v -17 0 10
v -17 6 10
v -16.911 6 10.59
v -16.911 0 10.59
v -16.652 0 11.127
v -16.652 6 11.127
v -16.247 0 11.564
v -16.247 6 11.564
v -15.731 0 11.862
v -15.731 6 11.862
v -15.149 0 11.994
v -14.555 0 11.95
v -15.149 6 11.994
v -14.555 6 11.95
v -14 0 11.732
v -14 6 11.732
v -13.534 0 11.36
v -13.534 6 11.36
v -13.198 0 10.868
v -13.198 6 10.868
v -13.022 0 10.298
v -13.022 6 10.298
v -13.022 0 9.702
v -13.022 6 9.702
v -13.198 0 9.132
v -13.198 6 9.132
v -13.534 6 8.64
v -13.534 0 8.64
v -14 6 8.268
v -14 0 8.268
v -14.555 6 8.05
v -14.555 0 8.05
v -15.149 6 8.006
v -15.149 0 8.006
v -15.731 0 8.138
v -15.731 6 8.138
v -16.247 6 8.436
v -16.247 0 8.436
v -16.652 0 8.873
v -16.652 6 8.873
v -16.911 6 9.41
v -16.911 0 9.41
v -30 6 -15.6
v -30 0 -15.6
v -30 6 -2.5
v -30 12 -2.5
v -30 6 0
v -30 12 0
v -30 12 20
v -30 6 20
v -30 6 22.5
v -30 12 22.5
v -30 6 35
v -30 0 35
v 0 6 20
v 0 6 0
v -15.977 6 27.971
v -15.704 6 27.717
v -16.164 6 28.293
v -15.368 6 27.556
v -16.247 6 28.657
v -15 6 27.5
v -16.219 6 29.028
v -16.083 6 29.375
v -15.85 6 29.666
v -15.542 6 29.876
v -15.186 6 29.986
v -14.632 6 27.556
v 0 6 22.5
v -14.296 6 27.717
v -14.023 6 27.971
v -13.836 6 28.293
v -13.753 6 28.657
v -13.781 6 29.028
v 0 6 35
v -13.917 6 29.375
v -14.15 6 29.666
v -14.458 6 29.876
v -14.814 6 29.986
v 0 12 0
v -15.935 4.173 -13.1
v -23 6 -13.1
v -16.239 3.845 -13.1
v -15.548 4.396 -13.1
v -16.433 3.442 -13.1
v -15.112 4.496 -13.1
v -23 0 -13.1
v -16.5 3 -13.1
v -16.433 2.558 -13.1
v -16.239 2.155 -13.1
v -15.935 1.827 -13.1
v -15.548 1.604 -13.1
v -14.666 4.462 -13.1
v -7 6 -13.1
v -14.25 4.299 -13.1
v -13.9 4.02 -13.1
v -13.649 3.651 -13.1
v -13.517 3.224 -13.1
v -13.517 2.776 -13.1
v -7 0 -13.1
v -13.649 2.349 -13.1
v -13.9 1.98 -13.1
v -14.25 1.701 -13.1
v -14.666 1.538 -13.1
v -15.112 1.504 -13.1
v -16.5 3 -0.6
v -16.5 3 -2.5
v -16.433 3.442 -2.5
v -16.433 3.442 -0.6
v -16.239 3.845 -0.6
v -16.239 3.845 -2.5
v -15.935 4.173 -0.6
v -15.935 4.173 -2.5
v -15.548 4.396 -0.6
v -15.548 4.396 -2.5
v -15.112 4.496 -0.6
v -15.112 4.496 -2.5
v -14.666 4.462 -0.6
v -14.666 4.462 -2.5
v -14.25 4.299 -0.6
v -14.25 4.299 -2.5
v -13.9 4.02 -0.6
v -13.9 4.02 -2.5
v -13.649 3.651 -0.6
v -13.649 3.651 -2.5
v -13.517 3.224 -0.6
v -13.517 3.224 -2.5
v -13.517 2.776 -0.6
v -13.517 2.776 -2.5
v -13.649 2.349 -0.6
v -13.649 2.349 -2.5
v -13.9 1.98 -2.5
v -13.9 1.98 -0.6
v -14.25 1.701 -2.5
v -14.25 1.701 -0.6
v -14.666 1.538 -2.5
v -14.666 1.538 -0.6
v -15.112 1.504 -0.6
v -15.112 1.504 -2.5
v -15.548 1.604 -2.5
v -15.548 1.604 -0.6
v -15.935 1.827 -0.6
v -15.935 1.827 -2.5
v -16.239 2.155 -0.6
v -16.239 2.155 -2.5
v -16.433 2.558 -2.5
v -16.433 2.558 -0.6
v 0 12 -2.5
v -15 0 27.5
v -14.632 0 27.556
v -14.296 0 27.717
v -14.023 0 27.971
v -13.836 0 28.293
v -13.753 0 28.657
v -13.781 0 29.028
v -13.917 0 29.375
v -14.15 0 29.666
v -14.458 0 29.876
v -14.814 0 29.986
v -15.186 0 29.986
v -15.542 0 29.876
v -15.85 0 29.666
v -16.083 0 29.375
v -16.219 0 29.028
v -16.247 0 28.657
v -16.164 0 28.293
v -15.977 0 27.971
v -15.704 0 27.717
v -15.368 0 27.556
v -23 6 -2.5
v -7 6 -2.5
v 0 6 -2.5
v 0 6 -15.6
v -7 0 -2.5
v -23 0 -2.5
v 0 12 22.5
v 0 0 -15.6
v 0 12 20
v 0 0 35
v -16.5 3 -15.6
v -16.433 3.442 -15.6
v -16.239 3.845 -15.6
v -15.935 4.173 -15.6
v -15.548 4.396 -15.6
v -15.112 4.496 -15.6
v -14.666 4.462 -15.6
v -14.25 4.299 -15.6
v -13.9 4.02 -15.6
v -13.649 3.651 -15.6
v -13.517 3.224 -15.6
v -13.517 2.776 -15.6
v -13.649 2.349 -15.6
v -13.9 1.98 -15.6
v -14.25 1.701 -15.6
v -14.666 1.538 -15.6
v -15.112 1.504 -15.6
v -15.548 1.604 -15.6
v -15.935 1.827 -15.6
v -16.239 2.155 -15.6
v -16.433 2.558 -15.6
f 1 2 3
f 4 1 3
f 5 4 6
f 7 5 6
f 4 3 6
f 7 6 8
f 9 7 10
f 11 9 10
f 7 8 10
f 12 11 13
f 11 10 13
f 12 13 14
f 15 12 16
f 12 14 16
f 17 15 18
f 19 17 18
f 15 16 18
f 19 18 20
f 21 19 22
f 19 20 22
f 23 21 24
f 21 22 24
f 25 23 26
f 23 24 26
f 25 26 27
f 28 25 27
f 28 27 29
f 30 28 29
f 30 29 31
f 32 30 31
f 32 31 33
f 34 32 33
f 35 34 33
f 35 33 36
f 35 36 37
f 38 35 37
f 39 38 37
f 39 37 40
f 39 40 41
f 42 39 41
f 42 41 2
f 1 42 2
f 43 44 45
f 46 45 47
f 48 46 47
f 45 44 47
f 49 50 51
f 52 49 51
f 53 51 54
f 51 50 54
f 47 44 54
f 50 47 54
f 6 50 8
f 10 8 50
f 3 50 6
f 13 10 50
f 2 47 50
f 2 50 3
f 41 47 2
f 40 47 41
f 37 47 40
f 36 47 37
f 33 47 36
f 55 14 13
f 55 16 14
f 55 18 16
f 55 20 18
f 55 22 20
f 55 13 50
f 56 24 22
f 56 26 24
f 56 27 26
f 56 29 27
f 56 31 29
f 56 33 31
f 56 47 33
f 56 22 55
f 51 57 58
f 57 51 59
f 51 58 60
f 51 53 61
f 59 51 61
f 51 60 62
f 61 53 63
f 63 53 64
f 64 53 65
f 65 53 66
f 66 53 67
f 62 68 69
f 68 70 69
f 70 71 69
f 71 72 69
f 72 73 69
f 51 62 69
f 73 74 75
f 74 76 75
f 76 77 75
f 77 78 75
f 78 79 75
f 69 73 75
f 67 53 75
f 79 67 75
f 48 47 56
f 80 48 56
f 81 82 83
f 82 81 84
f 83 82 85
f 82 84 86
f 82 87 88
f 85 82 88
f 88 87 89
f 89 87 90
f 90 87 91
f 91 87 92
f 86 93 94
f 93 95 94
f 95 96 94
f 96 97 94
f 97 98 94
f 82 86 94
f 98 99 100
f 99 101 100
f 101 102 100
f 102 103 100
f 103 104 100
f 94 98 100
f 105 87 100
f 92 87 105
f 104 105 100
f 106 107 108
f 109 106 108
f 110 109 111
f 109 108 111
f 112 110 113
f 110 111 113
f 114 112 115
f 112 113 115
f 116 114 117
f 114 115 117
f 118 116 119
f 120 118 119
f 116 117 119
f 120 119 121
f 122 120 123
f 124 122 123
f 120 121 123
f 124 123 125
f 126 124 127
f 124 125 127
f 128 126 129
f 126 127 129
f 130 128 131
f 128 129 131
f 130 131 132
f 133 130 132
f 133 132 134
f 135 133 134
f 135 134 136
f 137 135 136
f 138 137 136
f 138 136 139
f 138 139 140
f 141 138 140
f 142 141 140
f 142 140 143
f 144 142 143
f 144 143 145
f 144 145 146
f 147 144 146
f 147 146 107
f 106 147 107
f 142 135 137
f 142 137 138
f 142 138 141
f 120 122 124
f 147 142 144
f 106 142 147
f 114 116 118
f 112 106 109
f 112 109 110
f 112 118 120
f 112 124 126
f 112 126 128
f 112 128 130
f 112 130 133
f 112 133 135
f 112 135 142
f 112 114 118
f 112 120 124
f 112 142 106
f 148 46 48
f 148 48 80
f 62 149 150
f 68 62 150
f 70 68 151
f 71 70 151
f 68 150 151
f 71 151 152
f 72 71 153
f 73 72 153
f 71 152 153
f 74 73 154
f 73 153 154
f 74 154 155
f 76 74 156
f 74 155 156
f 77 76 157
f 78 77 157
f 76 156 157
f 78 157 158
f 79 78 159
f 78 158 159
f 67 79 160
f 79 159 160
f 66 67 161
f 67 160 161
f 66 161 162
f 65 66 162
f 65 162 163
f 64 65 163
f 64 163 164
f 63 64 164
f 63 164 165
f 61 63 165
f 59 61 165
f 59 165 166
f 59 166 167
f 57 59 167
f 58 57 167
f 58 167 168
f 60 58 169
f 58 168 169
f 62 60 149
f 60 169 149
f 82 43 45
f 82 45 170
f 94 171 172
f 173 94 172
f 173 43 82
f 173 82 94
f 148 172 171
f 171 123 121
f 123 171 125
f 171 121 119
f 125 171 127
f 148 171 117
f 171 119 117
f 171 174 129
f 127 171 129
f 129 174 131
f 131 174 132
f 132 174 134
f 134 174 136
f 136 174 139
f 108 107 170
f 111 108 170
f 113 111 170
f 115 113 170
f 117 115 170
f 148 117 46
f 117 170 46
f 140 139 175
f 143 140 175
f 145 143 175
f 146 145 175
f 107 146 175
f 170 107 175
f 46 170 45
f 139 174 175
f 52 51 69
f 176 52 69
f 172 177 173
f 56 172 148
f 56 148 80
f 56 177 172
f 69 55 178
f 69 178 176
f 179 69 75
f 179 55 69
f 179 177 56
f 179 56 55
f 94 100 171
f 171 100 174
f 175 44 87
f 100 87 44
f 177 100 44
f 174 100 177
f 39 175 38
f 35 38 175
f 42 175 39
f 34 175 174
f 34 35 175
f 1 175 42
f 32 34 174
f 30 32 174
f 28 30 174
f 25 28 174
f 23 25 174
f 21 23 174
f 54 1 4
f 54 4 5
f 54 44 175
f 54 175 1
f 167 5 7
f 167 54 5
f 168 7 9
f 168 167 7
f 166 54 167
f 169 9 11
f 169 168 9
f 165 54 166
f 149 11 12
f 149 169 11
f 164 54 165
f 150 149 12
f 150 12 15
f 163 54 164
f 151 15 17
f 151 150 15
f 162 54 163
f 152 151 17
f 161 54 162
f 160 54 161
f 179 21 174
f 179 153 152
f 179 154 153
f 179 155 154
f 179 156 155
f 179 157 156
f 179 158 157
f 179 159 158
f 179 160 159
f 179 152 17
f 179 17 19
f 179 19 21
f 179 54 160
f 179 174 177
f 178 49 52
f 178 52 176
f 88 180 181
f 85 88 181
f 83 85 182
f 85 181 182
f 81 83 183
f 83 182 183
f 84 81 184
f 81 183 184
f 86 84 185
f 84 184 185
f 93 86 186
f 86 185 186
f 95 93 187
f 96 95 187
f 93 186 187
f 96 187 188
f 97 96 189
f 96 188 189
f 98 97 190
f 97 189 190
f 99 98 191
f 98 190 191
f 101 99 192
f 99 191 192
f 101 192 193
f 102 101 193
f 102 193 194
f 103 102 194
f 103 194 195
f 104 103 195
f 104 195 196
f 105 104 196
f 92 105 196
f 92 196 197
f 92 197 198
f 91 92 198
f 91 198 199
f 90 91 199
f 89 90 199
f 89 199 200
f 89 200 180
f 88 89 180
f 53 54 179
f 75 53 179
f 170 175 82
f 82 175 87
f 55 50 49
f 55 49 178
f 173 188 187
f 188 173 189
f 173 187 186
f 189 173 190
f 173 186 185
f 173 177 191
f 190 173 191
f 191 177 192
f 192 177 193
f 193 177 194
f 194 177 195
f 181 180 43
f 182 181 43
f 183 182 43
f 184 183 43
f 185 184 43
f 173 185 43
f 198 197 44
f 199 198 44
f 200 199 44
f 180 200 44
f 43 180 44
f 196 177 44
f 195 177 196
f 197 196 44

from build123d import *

# Parameters (mm, degrees)
SKETCH1_W           = 30
SKETCH1_H           = 38.1
SKETCH1_W_2         = 16
SKETCH1_H_2         = 10.6
BOSS_EXTRUDE1_DEPTH = 6
SKETCH1_3_W         = 30
SKETCH1_3_H         = 2.5
BOSS_EXTRUDE2_DEPTH = 12
SKETCH3_R           = 1.5
CUT_EXTRUDE2_DEPTH  = 15
SKETCH2_R           = 2
CUT_EXTRUDE1_DEPTH  = 38.976966704
SKETCH5_W           = 30
SKETCH5_H           = 12.5
SKETCH5_R           = 1.25
BOSS_EXTRUDE3_DEPTH = 6


with BuildPart() as part:
    # Sketch1 → Boss-Extrude1 (new body)
    with BuildSketch(Plane(origin=(0, 0, 0), x_dir=(1, 0, 0), z_dir=(0, 1, 0))):
        with Locations((-15, -3.45)):
            Rectangle(SKETCH1_W, SKETCH1_H)
        with Locations((-15, 7.8)):
            Rectangle(SKETCH1_W_2, SKETCH1_H_2, mode=Mode.SUBTRACT)
    extrude(amount=BOSS_EXTRUDE1_DEPTH)

    # Sketch1<3> → Boss-Extrude2 (add)
    with BuildSketch(Plane(origin=(0, 0, 0), x_dir=(1, 0, 0), z_dir=(0, 1, 0))):
        with Locations((-15, -21.25)):
            Rectangle(SKETCH1_3_W, SKETCH1_3_H)
        with Locations((-15, 1.25)):
            Rectangle(SKETCH1_3_W, SKETCH1_3_H)
    extrude(amount=BOSS_EXTRUDE2_DEPTH)

    # Sketch3 → Cut-Extrude2 (cut)
    with BuildSketch(Plane(origin=(0, 0, -15.6), x_dir=(-1, 0, 0), z_dir=(0, 0, -1))):
        with Locations((15, 3)):
            Circle(SKETCH3_R)
    extrude(amount=-CUT_EXTRUDE2_DEPTH, mode=Mode.SUBTRACT)

    # Sketch2 → Cut-Extrude1 (cut, through all)
    with BuildSketch(Plane(origin=(0, 6, 0), x_dir=(1, 0, 0), z_dir=(0, 1, 0))):
        with Locations((-15, -10)):
            Circle(SKETCH2_R)
    extrude(amount=-CUT_EXTRUDE1_DEPTH, mode=Mode.SUBTRACT)

    # Sketch5 → Boss-Extrude3 (add)
    with BuildSketch(Plane.XZ):
        with Locations((-15, 28.75)):
            Rectangle(SKETCH5_W, SKETCH5_H)
        with Locations((-15, 28.75)):
            Circle(SKETCH5_R, mode=Mode.SUBTRACT)
    extrude(amount=-BOSS_EXTRUDE3_DEPTH)


solid = part.part
